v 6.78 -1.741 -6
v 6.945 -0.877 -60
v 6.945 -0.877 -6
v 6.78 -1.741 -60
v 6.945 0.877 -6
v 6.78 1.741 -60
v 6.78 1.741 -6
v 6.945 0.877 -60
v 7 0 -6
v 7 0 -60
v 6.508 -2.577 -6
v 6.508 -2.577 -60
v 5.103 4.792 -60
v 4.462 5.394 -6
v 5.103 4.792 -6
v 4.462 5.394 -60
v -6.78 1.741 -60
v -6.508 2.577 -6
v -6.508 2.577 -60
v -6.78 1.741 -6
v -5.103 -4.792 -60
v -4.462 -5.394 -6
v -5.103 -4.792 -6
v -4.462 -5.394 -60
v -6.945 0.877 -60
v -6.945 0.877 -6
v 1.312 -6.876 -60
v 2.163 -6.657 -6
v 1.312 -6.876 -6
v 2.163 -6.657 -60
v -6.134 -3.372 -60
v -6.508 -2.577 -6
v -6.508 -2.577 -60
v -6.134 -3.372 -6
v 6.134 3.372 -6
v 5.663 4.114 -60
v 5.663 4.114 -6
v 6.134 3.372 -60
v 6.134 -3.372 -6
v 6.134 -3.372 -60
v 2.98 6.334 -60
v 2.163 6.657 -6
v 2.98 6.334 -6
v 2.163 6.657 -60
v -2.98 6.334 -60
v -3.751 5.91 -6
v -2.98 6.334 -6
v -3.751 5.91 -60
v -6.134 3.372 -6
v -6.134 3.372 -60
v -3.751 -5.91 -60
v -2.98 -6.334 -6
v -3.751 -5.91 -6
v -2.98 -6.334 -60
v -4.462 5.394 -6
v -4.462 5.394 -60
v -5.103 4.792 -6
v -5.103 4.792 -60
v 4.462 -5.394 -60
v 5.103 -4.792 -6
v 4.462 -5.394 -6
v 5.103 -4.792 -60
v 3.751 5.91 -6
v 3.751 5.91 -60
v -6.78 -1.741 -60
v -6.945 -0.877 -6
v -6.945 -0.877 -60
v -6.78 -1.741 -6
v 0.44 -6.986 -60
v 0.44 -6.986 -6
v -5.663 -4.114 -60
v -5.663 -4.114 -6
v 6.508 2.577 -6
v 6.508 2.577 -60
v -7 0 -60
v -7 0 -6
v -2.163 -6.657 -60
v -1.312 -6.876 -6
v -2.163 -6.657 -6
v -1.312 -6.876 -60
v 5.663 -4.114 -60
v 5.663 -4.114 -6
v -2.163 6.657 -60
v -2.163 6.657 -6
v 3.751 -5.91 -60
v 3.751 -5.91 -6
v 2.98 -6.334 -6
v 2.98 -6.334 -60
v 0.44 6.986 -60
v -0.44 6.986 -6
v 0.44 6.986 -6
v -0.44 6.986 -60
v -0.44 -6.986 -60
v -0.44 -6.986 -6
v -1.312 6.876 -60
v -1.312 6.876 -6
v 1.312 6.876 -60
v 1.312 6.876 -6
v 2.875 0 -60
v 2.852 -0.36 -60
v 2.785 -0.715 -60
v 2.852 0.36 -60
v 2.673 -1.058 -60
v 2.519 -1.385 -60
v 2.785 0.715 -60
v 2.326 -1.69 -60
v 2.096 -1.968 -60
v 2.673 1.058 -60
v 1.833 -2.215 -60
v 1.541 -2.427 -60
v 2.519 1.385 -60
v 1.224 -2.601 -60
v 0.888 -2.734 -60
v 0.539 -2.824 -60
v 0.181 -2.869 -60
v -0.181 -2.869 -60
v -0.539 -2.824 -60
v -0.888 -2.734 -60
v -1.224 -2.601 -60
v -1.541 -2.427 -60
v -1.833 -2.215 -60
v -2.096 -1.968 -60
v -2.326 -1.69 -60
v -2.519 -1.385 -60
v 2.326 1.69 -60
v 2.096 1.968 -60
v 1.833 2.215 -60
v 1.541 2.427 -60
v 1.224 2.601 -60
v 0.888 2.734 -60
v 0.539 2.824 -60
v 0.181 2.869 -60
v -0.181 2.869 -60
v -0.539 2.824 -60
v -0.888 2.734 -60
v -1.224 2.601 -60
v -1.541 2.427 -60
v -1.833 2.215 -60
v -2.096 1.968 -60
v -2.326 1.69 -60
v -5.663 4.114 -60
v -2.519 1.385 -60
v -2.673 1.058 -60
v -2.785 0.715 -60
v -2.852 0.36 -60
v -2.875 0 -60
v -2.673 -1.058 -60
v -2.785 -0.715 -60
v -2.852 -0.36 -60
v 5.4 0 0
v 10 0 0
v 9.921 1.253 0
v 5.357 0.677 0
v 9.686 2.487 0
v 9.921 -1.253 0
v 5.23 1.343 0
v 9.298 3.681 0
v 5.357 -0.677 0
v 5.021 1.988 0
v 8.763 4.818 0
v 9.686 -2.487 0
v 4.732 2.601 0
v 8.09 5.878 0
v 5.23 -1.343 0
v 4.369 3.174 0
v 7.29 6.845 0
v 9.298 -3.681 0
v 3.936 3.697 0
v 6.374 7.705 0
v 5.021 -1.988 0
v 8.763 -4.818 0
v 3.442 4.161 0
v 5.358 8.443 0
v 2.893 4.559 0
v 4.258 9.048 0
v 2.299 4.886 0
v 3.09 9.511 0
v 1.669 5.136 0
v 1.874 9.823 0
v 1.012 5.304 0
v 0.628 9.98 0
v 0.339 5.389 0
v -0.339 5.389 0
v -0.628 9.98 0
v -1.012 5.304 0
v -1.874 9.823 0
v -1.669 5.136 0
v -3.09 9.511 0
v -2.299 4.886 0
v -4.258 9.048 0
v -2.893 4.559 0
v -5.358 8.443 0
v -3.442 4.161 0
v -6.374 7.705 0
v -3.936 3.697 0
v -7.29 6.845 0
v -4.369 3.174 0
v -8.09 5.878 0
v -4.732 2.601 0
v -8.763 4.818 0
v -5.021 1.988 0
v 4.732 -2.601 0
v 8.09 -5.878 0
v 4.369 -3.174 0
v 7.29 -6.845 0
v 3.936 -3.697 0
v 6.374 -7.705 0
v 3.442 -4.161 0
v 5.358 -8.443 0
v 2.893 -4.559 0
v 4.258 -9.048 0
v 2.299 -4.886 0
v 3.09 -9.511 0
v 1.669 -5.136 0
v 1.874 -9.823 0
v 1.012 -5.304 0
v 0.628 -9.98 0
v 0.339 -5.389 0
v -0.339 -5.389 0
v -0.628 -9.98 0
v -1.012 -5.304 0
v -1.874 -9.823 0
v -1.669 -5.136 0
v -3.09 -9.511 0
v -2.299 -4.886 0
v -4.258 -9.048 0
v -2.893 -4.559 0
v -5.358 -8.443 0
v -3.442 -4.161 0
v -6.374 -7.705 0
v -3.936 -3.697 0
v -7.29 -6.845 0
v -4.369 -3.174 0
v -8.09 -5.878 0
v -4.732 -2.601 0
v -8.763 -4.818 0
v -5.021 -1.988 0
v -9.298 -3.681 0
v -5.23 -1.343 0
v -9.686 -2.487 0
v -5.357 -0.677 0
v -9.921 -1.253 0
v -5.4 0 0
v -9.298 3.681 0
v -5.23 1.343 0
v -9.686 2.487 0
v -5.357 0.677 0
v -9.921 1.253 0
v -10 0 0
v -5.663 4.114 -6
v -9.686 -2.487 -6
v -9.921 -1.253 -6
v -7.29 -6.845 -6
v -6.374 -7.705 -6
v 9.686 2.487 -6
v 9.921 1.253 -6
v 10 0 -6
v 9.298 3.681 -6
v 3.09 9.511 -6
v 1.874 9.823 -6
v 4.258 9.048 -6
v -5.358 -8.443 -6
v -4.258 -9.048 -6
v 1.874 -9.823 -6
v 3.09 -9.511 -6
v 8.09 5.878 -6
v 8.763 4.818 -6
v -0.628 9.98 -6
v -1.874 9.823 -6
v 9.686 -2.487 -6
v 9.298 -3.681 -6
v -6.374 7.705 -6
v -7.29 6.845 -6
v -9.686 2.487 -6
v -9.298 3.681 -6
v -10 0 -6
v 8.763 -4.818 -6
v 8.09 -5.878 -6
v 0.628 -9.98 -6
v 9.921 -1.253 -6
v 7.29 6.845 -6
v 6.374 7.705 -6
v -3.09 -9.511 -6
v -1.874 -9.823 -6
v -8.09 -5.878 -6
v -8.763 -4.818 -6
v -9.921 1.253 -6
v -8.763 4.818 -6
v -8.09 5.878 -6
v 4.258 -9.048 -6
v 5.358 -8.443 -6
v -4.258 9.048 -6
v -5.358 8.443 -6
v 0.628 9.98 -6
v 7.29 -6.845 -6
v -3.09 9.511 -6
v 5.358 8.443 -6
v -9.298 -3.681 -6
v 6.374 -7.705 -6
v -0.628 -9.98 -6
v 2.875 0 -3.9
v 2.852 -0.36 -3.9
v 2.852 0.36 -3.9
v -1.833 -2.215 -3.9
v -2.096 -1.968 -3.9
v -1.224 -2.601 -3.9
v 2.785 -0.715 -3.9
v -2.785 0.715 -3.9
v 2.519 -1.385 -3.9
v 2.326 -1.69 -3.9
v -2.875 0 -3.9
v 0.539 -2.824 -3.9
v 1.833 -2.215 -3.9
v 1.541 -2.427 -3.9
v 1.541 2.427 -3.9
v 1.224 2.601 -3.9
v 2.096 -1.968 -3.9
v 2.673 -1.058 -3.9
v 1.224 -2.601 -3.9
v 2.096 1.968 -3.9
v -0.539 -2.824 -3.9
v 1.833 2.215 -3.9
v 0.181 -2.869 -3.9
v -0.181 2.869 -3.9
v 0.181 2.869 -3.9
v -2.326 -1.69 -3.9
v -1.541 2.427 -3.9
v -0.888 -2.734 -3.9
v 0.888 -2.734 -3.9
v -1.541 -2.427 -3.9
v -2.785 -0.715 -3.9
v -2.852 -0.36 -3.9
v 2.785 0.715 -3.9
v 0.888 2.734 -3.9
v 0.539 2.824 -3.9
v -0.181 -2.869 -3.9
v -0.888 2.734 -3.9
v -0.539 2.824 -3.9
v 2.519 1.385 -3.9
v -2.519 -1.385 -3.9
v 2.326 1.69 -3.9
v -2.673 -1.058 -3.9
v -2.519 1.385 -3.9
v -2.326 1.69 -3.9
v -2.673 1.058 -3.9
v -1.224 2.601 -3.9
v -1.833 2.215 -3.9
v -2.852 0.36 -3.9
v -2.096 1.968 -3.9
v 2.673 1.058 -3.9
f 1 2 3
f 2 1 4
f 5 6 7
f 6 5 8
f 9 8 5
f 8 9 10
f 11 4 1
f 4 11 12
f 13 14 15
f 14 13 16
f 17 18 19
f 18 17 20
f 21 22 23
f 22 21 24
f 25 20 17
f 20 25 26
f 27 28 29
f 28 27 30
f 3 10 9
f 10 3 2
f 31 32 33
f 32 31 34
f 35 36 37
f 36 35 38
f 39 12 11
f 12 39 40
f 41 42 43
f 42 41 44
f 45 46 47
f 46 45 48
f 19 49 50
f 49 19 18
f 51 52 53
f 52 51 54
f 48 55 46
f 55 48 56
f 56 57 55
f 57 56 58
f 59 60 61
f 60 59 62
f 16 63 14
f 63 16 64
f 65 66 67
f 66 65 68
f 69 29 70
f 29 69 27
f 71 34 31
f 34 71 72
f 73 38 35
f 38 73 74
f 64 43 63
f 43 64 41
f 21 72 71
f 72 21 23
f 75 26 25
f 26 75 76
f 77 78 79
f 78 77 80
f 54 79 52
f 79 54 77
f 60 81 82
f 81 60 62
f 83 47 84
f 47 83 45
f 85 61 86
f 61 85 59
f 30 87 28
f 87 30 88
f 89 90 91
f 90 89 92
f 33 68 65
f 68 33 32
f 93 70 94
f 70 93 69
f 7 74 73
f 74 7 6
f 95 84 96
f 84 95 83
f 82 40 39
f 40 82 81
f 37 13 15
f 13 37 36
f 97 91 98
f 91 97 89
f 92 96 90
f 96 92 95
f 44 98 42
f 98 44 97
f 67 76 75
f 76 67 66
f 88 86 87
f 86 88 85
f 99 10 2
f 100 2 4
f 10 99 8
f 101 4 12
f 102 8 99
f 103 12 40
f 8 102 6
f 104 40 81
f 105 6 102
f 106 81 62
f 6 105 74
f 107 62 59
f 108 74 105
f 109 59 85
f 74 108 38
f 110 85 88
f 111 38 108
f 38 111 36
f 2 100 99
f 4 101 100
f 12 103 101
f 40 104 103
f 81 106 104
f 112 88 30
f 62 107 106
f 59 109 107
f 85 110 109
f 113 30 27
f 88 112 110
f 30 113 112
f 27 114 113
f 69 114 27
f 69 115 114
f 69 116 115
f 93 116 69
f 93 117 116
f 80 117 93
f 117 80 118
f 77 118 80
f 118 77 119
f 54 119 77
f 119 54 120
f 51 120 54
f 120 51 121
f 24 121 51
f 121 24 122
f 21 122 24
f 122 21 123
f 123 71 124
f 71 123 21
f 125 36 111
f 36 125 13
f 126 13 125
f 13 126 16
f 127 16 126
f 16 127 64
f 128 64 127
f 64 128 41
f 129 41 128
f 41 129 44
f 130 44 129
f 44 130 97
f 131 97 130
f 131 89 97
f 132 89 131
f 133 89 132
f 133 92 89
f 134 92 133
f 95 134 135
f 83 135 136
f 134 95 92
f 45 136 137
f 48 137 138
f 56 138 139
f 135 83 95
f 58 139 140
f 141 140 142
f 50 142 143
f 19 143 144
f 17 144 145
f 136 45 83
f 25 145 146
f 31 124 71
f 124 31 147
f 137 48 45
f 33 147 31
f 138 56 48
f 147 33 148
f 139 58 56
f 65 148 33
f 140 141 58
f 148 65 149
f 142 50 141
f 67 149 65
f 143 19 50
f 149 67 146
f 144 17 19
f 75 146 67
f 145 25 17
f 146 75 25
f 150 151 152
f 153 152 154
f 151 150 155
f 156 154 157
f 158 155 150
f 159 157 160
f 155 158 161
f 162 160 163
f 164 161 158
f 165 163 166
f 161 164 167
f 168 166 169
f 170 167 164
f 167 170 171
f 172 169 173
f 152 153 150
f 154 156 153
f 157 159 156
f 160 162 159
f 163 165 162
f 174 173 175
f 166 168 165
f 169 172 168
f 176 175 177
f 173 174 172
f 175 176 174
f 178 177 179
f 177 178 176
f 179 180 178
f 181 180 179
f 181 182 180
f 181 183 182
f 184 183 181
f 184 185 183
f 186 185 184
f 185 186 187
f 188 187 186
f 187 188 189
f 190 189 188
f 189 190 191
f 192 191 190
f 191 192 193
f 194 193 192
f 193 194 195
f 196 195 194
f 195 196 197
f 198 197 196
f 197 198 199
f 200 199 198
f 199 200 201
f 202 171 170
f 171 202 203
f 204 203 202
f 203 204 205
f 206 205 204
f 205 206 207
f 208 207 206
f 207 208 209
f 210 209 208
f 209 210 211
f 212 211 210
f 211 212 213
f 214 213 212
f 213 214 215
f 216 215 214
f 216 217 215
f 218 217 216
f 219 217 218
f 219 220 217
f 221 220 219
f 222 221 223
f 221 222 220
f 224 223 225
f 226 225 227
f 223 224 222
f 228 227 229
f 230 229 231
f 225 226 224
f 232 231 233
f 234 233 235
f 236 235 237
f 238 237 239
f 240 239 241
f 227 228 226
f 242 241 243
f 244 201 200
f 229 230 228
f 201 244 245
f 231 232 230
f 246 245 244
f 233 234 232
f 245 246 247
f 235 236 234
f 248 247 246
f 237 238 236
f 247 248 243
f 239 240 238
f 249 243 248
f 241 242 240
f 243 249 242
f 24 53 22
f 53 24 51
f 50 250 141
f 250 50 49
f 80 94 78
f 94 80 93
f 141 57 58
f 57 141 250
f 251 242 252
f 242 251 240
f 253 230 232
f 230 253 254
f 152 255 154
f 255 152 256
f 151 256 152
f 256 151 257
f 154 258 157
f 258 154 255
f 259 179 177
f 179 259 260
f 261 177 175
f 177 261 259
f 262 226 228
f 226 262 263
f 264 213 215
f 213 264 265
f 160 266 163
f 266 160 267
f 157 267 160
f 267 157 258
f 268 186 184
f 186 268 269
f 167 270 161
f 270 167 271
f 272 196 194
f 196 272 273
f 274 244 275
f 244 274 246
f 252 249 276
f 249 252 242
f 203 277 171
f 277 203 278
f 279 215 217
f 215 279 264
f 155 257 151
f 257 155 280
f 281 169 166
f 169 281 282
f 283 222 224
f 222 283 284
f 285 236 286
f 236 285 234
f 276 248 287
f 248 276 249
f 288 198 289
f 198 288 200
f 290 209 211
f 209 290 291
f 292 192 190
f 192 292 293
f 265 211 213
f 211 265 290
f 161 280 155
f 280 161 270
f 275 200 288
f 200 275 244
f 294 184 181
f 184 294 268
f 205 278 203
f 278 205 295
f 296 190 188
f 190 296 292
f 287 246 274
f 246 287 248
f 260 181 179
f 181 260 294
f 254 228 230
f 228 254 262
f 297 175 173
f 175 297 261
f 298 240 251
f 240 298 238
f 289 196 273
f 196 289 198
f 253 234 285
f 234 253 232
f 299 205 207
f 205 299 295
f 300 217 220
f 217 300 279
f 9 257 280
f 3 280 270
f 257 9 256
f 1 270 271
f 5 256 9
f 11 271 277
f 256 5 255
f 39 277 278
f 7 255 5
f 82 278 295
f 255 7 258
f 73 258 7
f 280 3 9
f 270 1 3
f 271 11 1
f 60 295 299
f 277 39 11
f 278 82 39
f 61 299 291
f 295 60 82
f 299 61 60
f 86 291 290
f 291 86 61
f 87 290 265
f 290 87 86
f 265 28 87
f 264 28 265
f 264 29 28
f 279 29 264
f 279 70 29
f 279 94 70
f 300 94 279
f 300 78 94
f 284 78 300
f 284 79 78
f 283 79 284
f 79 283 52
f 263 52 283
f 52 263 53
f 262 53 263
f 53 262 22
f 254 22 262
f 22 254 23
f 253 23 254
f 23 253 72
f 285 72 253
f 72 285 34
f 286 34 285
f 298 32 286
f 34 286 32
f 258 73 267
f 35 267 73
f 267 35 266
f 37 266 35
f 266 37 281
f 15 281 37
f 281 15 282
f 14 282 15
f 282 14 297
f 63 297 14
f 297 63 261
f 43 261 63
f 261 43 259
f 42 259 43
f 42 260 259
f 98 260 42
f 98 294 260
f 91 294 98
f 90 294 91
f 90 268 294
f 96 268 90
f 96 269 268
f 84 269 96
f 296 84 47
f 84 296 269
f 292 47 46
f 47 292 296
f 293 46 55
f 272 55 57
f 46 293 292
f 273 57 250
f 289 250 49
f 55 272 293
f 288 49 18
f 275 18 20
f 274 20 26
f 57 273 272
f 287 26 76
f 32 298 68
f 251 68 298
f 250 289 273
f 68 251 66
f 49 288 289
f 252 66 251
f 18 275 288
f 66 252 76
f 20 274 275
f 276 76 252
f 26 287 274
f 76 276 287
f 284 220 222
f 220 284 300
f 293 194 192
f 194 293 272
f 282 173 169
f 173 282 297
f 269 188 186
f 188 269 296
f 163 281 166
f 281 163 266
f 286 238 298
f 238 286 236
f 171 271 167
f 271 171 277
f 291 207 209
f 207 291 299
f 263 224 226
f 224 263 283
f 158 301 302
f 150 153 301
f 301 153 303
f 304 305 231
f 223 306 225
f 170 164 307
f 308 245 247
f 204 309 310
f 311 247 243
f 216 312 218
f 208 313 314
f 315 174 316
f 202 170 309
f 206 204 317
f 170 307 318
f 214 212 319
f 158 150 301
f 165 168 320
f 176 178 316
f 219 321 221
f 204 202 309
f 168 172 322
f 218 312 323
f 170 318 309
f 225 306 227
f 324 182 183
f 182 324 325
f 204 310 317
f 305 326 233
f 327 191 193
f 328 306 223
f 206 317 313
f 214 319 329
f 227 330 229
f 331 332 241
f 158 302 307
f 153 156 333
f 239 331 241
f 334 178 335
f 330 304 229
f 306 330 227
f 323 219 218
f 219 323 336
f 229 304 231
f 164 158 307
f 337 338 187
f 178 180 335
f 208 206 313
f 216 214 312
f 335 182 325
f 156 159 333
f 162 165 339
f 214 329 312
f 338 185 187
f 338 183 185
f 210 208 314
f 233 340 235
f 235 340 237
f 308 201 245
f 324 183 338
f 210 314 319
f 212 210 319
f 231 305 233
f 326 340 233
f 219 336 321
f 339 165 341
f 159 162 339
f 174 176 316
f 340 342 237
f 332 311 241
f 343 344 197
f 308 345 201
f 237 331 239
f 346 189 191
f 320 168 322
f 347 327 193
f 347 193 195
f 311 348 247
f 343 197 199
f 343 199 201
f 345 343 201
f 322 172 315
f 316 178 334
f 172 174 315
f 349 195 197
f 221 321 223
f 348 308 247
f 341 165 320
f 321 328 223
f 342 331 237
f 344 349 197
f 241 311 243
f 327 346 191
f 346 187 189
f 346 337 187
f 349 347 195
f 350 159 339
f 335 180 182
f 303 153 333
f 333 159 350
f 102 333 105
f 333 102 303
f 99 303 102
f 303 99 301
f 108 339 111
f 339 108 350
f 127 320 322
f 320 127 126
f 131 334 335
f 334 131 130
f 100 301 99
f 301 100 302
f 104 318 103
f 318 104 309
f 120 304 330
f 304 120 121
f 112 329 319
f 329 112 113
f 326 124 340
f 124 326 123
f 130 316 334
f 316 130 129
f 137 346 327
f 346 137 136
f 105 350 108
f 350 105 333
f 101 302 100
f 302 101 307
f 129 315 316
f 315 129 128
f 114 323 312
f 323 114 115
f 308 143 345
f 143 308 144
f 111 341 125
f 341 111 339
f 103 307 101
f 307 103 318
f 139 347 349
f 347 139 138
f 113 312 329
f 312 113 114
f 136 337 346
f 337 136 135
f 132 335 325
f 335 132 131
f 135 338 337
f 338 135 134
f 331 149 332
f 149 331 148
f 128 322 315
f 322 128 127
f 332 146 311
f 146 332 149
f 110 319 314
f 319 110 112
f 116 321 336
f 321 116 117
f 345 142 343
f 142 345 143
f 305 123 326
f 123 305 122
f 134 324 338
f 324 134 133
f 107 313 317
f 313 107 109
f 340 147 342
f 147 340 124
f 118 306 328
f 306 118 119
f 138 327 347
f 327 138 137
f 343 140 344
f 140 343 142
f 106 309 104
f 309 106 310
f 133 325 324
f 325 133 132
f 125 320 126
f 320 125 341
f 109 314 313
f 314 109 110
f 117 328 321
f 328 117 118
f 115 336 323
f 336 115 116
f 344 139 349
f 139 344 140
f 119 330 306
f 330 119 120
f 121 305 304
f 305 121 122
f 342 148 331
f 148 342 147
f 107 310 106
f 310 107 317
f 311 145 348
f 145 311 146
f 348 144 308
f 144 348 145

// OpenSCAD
$fn = 50;


difference() {
	union() {
		translate(v = [0, 0, -60.0000000000]) {
			cylinder(h = 60, r = 7.0000000000);
		}
		translate(v = [0, 0, -6.0000000000]) {
			cylinder(h = 6, r = 10.0000000000);
		}
	}
	union() {
		translate(v = [0, 0, 0]) {
			rotate(a = [0, 0, 0]) {
				difference() {
					union() {
						#translate(v = [0, 0, -60.0000000000]) {
							cylinder(h = 60, r = 2.6000000000);
						}
						#translate(v = [0, 0, -3.9000000000]) {
							cylinder(h = 3.9000000000, r1 = 2.8750000000, r2 = 5.4000000000);
						}
						#translate(v = [0, 0, -60.0000000000]) {
							cylinder(h = 60, r = 2.8750000000);
						}
						#translate(v = [0, 0, -60.0000000000]) {
							cylinder(h = 60, r = 2.6000000000);
						}
					}
					union();
				}
			}
		}
	}
}
